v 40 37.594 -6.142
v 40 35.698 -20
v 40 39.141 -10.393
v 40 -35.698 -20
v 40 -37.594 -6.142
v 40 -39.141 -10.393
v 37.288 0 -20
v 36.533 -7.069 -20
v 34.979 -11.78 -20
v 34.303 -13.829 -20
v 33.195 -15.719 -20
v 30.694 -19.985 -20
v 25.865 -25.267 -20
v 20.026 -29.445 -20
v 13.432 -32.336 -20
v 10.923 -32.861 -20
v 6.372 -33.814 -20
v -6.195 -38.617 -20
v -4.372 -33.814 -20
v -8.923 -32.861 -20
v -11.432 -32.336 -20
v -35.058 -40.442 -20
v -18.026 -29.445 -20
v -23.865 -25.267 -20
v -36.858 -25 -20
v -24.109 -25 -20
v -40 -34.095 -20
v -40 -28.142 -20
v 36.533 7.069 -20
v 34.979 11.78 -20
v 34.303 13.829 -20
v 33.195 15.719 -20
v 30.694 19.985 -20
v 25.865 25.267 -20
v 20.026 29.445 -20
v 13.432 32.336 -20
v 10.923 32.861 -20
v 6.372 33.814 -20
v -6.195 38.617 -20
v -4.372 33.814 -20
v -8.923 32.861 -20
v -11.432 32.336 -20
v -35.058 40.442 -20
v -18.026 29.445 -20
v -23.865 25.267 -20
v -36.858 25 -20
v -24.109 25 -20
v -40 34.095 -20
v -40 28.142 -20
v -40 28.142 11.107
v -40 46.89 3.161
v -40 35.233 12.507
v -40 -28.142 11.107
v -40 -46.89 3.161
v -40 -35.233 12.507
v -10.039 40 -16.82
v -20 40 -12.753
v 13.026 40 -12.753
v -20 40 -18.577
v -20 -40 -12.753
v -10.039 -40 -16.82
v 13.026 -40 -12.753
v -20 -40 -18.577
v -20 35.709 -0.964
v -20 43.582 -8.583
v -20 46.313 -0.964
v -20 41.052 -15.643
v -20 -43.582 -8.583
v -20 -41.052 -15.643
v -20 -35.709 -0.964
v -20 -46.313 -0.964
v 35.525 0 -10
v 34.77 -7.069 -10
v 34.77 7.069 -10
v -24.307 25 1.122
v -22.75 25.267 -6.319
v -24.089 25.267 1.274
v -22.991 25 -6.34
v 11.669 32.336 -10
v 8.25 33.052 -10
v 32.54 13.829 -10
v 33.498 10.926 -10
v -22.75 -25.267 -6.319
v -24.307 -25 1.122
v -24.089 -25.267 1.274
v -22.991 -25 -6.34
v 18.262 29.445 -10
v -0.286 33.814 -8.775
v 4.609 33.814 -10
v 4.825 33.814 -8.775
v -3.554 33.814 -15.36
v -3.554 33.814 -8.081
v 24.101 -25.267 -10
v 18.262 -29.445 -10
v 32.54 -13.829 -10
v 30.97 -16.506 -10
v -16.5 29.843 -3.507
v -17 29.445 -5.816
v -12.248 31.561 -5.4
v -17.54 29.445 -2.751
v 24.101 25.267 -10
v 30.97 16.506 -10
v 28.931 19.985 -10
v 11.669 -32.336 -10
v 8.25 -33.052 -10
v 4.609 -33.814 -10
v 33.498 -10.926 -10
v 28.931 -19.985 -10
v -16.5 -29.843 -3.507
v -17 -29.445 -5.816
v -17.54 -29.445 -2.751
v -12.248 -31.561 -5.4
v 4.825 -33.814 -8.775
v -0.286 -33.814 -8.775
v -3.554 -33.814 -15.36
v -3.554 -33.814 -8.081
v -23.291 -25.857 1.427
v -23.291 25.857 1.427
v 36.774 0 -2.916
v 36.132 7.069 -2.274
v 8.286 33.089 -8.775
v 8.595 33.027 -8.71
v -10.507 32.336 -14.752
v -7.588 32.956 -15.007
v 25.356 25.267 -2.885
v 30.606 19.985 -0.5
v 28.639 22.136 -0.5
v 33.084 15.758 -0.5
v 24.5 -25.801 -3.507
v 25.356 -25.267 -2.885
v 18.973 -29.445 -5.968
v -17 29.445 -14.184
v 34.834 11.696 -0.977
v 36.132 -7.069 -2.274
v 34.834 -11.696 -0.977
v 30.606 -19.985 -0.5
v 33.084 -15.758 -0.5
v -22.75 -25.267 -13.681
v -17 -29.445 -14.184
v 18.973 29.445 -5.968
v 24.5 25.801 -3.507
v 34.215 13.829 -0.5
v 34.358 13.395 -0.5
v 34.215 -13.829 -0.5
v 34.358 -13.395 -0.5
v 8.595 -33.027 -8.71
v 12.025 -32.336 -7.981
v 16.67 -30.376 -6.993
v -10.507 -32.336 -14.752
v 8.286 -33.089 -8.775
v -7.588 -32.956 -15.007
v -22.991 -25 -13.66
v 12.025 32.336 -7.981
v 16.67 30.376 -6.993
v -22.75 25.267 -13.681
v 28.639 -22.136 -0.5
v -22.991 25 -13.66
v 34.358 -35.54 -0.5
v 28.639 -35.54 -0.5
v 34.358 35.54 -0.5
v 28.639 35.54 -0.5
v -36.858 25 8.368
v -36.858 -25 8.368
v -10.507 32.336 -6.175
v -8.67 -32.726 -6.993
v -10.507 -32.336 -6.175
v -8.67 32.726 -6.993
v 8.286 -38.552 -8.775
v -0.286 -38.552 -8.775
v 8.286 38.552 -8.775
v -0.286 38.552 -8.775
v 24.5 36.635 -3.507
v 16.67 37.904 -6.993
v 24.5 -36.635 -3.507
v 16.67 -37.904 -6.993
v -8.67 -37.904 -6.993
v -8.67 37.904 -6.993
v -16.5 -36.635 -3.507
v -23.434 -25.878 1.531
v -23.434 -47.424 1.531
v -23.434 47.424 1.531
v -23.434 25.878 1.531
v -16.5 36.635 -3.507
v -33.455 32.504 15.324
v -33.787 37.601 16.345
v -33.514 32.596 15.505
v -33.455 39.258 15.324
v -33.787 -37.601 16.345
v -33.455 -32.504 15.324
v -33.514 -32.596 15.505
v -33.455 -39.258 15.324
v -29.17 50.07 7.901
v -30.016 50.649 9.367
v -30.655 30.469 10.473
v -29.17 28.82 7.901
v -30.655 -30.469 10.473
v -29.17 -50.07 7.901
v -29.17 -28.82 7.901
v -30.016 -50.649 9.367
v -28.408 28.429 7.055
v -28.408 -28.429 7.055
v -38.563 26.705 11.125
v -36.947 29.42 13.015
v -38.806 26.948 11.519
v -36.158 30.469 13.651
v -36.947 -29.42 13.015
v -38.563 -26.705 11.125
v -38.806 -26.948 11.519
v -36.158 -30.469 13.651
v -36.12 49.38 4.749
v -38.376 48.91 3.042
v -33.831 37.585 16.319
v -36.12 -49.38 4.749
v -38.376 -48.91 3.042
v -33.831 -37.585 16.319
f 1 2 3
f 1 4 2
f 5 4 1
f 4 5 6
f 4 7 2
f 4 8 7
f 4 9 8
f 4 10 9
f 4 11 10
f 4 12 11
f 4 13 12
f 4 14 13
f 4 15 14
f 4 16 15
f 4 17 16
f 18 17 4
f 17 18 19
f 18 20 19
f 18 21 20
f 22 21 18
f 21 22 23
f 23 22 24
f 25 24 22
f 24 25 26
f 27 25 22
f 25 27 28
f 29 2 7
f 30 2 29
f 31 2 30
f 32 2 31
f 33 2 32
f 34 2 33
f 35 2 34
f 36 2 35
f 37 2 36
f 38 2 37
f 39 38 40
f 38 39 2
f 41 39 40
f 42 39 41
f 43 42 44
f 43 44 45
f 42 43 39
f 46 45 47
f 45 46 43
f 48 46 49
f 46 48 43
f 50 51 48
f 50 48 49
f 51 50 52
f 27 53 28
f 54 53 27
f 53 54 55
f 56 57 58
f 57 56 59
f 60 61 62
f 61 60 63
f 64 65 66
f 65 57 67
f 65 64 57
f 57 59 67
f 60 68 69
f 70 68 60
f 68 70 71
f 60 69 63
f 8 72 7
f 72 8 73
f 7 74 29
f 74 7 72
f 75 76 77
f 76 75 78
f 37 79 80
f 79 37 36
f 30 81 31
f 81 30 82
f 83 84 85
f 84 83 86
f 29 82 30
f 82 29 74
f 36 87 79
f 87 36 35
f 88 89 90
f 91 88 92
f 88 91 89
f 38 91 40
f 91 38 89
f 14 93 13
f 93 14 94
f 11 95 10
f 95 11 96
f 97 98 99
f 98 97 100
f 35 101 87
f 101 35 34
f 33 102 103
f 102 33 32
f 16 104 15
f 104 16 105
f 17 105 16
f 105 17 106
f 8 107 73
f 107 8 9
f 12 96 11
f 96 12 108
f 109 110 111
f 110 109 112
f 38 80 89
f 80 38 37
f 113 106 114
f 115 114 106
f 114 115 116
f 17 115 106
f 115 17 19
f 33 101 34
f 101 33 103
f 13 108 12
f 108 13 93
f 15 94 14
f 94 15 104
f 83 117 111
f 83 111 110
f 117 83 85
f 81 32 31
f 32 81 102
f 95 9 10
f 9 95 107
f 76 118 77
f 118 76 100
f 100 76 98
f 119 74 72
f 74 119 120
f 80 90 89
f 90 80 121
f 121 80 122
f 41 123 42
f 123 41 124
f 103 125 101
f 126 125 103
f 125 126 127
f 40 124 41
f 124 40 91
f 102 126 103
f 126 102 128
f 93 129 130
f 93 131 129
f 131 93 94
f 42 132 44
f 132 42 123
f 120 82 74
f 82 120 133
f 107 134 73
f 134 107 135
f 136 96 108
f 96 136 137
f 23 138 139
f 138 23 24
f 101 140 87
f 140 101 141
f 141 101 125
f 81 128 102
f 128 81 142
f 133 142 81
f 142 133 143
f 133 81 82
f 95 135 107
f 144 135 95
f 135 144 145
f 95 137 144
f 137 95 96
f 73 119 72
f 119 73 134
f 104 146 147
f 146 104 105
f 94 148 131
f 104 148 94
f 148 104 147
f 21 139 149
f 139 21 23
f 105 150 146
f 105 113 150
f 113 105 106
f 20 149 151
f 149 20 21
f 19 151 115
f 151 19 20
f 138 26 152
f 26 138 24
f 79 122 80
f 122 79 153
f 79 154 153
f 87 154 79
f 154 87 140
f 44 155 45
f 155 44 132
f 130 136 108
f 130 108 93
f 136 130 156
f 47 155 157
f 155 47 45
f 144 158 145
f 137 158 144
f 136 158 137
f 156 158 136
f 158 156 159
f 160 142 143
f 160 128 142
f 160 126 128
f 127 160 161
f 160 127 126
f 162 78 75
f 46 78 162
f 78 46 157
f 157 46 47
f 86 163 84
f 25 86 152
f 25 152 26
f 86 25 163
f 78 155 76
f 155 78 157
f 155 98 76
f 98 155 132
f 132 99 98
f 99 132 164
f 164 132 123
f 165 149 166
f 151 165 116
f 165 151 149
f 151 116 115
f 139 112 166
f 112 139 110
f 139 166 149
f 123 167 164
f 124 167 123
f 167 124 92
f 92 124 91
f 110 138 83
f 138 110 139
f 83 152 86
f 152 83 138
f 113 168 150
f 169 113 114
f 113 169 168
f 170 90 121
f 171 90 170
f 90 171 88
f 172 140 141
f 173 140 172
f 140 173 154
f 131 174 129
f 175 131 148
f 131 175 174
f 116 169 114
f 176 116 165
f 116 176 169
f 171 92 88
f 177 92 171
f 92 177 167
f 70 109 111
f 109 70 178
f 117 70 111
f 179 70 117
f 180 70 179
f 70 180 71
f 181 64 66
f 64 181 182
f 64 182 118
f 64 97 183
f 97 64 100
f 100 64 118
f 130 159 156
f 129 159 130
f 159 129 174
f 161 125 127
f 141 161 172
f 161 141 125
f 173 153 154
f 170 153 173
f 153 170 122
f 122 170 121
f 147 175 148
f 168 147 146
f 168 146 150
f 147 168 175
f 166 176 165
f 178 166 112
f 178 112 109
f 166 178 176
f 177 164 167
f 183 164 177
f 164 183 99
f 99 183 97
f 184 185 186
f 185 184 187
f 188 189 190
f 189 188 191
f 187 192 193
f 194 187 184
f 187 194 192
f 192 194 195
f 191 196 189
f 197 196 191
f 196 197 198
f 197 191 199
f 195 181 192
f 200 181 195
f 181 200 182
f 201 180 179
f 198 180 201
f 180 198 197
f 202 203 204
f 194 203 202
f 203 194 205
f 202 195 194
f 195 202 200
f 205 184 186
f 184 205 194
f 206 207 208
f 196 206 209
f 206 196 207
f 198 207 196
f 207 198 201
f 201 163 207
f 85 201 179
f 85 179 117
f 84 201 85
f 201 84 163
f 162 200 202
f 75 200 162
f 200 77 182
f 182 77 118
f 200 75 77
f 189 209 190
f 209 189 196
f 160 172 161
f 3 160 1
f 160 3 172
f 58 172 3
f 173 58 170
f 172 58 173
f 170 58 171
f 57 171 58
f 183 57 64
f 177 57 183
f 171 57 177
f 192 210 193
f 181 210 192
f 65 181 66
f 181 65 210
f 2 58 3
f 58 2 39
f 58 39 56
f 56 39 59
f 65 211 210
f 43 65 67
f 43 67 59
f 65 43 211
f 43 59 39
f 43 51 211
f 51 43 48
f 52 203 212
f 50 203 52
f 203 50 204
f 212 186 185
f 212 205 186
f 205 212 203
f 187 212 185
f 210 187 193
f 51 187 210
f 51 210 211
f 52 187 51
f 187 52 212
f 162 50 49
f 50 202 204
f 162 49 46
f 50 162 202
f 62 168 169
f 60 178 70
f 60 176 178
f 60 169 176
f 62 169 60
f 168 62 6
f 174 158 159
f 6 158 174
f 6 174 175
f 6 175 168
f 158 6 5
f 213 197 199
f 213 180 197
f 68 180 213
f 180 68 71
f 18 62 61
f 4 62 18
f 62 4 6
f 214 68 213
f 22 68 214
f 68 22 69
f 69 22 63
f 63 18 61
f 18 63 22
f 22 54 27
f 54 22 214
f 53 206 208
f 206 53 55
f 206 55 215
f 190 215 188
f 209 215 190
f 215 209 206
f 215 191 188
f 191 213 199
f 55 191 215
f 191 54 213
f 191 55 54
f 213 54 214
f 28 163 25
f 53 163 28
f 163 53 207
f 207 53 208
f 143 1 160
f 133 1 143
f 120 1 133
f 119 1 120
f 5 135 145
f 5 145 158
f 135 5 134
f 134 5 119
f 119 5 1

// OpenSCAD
module bkThesisNeck() {
	width = 80;
	height = 40;
	depth = 80; 
	
	module core() { 
		union() {
			cube([width, depth, height], center = true);
			translate([-30,50,0]) {
				cube([20, 20, 40], center = true);
			}
			translate([-30,-50,0]) {
				cube([20, 20, 40], center = true);
			}	
		}
	}

	module hole() {

		module neck() {
			union() {
				translate([20.5,0,20]) {
					cube([width +1, depth +1, height + 1], center = true);
				}
				translate([-16,0,0]) {
					cube([width, depth -30, height + 1], center = true);
				}
				translate([-16,0,0]) {
					sphere([width, depth -30, height + 1], center = true);
				}
				cylinder(height + 2,34,34, center = true);

				translate([1,0,-10]) {
					rotate(a=[0,-10,0]) {
						cylinder(height * 2,34,34, center = true);
					}
					rotate(a=[0,10,0]) {
						cylinder(height * 2,34,34, center = true);
					}
				}
				translate([4,0,32]) {
					rotate(a=[90,0,0]) {
						cylinder(height * 4,41,41, center = true);
					}
				}
				translate([-20,0,36]) {
					rotate(a=[0,-60,0]) {
						cylinder(height,41,41, center = true);
					}
				}

			}
		}

		module sides() {
			union() {
				translate([20.5,46,0]) {
					rotate(a=[20,0,0]) {
						cube([width + 1, 20, 80], center = true);
					}
				}
				translate([0,46,-28]) {
					rotate(a=[340,-10,0]) {
						cube([width * 2, 20, 200], center = true);
					}
				}
				translate([-41,50,-20]) {
					rotate(a=[340,20,45]) {
						cube([20, 20, 40], center = true);
					}
				}
				translate([-41,40,36]) {
					rotate(a=[0,330,20]) {
						cube([40, 40, 40], center = true);
					}
				}
				translate([-60,46,17]) {
					rotate(a=[-10,310,-28]) {
						cube([40, 80, 40], center = true);
					}
				}
				translate([-15,40,28]) {
					rotate(a=[0,45,0]) {
						//cube([30, 40, 40], center = true);
					}
				}
				translate([-46,20,0]) {
					rotate(a=[0,0,45]) {
						cube([20, 20, height + 2], center = true);
					}
				}
			}
		}
		module back() {
			union() {
				translate([48,0,0]) {
					rotate(a=[0,45,0]) {
						cube([20, depth, 20], center = true);
					}
				}
			}
		}
		union() {
			neck();
			sides();
			mirror([0,-50,0]) {
				sides();
			}
			back();
		}
	}
	
	difference() {
		core();
		hole();
	}
}

bkThesisNeck();
